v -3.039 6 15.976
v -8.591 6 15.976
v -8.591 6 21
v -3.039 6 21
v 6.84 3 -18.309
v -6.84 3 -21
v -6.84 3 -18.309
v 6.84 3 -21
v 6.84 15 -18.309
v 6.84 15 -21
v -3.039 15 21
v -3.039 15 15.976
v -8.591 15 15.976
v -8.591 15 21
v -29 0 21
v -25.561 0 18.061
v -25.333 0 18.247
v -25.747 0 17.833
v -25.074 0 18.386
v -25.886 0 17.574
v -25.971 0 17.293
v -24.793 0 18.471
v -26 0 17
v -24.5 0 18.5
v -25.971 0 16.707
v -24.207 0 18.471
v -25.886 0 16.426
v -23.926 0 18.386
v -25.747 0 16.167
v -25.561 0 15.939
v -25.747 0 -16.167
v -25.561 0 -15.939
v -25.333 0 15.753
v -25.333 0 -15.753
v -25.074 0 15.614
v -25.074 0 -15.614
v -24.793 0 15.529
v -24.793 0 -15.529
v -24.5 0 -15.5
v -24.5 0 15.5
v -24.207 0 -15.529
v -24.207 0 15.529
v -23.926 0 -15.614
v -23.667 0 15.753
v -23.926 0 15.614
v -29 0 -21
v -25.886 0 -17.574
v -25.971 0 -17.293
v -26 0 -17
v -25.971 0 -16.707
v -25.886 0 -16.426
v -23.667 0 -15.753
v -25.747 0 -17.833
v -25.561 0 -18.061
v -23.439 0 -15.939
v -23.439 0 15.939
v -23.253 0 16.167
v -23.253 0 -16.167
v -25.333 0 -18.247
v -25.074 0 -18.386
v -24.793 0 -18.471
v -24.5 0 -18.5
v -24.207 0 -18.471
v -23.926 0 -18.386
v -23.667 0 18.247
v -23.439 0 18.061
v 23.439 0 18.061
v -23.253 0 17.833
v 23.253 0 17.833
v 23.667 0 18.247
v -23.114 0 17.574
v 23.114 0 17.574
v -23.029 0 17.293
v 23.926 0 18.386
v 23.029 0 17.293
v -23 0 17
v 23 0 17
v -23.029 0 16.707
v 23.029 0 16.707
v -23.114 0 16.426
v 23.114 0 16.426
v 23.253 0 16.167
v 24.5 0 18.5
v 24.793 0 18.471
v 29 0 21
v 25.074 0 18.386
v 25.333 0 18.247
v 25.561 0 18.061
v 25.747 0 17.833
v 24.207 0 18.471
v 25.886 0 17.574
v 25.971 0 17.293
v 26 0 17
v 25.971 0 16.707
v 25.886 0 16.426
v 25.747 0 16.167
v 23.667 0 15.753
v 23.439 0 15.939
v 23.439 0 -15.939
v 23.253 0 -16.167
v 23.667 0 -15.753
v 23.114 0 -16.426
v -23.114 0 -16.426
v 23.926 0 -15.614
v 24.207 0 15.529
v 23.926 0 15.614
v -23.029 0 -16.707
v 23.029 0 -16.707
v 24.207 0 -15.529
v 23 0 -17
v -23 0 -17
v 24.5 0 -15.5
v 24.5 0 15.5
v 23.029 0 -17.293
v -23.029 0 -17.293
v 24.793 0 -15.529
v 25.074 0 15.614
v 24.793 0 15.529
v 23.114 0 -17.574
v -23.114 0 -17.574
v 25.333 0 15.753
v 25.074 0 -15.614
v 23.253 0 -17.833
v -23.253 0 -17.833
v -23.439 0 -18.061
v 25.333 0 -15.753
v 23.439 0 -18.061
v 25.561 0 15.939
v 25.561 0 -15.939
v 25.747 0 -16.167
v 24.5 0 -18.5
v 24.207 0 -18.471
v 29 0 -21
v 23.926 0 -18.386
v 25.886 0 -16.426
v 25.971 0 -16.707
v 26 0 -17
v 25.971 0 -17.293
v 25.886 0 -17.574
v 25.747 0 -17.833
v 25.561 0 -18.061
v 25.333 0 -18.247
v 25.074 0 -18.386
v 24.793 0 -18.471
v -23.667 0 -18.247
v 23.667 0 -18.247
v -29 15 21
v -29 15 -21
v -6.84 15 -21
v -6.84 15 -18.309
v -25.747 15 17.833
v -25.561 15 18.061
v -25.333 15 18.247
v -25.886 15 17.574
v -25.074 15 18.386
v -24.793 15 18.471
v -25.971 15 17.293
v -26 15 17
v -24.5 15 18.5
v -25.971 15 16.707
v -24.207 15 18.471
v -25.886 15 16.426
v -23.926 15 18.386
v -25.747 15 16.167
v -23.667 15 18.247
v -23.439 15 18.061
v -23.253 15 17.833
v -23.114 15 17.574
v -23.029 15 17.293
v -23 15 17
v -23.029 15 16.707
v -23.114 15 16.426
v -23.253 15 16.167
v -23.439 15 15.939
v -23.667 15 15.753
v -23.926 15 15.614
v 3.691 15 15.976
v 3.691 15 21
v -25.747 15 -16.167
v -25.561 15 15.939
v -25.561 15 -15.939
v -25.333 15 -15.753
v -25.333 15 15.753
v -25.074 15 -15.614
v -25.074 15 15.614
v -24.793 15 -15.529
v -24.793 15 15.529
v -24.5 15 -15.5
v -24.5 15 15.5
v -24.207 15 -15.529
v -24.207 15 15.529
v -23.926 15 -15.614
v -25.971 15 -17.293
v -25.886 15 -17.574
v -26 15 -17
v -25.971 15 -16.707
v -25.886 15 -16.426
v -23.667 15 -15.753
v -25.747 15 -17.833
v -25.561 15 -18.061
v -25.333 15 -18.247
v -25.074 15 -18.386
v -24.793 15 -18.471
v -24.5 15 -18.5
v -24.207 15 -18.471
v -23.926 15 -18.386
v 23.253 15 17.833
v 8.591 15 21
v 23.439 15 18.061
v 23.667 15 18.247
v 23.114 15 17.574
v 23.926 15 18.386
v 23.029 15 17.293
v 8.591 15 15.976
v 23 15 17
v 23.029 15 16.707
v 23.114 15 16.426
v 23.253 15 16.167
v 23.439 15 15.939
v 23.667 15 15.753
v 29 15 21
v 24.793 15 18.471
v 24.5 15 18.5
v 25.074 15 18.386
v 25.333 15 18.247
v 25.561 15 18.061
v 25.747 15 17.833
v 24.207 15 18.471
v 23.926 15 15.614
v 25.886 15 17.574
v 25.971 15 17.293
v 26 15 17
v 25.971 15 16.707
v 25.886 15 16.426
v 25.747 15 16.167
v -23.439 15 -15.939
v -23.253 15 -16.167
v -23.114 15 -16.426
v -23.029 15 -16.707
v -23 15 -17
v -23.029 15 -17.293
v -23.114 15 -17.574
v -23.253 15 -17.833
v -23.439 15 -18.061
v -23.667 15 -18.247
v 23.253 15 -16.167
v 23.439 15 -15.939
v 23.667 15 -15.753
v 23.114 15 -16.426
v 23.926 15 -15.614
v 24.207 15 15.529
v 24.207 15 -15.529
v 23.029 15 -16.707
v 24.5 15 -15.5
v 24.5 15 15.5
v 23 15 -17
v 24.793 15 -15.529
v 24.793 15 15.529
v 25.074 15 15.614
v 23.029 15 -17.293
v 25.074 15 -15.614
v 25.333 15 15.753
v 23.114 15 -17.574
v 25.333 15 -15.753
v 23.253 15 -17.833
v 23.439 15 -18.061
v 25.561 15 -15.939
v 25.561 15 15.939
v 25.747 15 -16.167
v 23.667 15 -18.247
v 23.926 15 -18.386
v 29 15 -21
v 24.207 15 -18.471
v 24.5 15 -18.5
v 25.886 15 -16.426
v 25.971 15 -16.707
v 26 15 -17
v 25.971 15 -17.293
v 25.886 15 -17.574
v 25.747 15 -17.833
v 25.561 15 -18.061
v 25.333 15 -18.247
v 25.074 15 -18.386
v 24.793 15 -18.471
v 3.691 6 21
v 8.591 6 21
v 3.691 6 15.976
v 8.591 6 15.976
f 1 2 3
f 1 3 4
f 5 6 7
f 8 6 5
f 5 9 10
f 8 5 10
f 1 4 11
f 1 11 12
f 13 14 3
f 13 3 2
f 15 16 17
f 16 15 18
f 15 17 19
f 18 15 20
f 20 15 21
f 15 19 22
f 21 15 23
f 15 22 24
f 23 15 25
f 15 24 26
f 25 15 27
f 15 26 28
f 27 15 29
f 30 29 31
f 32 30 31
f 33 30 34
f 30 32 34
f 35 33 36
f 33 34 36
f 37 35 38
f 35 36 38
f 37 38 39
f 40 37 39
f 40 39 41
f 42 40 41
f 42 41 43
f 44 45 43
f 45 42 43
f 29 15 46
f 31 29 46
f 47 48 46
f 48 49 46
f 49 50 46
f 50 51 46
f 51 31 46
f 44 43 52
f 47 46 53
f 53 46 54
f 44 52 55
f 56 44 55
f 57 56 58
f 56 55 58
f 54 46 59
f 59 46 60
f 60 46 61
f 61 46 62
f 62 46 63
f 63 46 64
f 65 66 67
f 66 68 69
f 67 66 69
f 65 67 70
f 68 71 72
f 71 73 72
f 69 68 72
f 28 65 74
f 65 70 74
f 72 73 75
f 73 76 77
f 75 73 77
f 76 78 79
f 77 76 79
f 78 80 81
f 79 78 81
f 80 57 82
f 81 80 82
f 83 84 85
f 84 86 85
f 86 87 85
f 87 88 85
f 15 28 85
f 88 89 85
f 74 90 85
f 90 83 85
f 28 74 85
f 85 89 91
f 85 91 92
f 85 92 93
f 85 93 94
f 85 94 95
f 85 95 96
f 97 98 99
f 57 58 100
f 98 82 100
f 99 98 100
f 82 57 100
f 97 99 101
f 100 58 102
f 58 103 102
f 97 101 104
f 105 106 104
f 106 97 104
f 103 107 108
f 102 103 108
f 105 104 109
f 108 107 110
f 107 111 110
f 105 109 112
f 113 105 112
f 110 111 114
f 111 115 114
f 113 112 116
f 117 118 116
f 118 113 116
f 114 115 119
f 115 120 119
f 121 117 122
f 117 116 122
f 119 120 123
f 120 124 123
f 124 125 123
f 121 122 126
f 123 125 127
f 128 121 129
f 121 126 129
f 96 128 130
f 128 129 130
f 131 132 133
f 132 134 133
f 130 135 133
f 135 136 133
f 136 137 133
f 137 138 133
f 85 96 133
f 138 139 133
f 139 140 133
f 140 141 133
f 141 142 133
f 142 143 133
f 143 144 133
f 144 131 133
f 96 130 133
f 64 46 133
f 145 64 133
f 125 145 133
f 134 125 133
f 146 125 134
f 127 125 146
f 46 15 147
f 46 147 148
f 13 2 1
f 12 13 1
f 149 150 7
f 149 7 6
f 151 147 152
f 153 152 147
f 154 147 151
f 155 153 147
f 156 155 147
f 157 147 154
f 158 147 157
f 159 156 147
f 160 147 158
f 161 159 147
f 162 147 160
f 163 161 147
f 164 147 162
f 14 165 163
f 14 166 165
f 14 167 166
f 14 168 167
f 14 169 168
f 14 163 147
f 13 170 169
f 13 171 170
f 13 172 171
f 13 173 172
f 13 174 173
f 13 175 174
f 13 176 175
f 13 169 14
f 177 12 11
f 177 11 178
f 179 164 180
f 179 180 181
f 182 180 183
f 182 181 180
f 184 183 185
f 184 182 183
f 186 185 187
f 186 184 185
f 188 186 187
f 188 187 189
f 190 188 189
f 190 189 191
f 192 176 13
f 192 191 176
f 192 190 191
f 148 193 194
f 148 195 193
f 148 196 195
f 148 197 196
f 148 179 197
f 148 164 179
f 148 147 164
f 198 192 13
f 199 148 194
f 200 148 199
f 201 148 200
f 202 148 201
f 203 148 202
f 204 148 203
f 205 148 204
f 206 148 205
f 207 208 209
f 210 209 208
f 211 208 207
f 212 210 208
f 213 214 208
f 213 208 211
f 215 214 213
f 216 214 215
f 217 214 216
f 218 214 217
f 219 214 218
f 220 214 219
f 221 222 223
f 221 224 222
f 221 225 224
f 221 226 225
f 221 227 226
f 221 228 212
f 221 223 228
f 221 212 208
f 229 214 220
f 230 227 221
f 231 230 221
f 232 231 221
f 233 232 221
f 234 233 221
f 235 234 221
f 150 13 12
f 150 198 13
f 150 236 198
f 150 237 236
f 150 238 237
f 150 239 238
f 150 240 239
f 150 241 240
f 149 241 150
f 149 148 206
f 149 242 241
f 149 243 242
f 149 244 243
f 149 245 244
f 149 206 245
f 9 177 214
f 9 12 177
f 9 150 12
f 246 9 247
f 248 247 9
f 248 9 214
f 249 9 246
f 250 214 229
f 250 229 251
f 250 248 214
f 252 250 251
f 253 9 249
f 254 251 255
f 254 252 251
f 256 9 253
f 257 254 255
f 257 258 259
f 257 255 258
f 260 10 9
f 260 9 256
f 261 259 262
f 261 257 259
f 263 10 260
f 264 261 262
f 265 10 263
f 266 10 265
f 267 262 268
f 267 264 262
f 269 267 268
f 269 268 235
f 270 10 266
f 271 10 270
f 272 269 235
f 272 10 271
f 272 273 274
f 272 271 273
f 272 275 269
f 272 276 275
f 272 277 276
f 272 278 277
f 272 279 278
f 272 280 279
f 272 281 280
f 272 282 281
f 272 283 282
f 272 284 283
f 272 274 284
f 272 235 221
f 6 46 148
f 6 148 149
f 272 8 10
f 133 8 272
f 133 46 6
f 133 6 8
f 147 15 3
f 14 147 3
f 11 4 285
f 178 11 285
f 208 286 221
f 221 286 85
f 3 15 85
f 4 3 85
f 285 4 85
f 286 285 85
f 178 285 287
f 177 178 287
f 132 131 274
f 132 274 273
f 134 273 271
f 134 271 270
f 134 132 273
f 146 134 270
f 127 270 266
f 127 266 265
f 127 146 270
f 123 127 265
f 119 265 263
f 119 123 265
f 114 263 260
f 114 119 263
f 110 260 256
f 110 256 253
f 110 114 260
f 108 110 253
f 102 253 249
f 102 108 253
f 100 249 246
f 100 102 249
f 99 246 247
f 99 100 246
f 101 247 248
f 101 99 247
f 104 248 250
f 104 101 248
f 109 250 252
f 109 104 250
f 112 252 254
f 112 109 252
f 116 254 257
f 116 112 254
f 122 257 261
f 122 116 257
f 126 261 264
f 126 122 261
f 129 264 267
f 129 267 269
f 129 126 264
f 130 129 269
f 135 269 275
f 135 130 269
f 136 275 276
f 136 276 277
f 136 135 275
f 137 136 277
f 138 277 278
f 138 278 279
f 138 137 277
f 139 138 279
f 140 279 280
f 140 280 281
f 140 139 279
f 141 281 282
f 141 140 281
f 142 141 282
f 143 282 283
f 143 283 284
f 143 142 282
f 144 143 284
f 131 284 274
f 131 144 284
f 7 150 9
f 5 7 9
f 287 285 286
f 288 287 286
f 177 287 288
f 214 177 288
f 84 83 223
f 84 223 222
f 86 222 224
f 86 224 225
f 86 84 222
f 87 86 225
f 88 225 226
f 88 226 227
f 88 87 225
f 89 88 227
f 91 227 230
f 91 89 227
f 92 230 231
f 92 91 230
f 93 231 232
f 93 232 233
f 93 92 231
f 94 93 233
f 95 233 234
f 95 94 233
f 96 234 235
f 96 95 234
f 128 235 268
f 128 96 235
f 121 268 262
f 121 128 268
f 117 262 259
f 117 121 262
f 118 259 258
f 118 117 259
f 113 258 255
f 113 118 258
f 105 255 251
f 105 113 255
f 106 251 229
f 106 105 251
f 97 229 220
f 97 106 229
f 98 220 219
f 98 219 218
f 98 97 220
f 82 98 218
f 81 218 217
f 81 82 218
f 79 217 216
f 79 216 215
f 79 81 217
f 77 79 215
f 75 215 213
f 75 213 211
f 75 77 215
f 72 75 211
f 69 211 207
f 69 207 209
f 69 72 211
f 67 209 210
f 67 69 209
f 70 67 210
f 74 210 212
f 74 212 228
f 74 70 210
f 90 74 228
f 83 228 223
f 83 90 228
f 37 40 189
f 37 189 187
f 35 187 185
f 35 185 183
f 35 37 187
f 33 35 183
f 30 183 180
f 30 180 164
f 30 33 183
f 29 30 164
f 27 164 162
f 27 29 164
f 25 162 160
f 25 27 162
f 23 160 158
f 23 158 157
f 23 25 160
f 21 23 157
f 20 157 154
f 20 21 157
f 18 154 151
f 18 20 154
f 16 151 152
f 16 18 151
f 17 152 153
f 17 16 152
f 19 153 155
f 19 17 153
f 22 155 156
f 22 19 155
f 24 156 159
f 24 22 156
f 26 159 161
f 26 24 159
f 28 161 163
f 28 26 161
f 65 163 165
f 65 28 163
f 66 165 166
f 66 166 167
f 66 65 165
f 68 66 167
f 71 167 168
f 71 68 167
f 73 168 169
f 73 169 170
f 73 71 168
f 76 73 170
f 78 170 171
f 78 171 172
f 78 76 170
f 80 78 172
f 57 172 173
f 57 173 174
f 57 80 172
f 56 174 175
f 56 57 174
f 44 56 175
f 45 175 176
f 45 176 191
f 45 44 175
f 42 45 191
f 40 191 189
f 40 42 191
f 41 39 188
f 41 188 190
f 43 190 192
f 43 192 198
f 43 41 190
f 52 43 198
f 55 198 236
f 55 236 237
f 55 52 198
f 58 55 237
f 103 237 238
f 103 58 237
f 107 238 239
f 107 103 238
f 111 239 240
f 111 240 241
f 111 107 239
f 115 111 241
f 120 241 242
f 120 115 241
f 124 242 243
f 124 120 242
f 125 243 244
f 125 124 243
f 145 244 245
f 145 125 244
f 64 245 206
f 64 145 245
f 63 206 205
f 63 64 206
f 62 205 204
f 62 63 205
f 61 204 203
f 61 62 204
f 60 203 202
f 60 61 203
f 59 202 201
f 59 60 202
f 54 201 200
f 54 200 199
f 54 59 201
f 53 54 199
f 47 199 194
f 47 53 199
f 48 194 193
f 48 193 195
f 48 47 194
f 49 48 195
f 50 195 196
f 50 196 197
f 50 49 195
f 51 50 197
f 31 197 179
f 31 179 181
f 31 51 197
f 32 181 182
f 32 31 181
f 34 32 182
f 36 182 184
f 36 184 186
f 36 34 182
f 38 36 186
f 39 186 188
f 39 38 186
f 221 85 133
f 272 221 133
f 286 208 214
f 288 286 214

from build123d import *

# Parameters (mm, degrees)
SKETCH_1_W          = 58
SKETCH_1_H          = 42
SKETCH_1_R          = 1.5
EXTRUDE_1_DEPTH     = 15
SKETCH_2_W          = 13.679310014
SKETCH_2_H          = 5.381736476
CUT_EXTRUDE_1_DEPTH = 12
SKETCH_3_W          = 17.182547944
SKETCH_3_H          = 10.048106392
CUT_EXTRUDE_2_DEPTH = 9
SKETCH_4_W          = 6.72992405
SKETCH_4_H          = 5.024053196
EXTRUDE_2_DEPTH     = 9


with BuildPart() as part:
    # 草图1 → 凸台-拉伸1 (new body)
    with BuildSketch(Plane(origin=(0, 0, 0), x_dir=(1, 0, 0), z_dir=(0, 1, 0))):
        Rectangle(SKETCH_1_W, SKETCH_1_H)
        with Locations(Location((-24.5, 17, 0), (0, 0, 270))):
            Circle(SKETCH_1_R, mode=Mode.SUBTRACT)
        with Locations(Location((-24.5, -17, 0), (0, 0, 90))):
            Circle(SKETCH_1_R, mode=Mode.SUBTRACT)
        with Locations(Location((24.5, -17, 0), (0, 0, 270))):
            Circle(SKETCH_1_R, mode=Mode.SUBTRACT)
        with Locations(Location((24.5, 17, 0), (0, 0, 90))):
            Circle(SKETCH_1_R, mode=Mode.SUBTRACT)
    extrude(amount=EXTRUDE_1_DEPTH)

    # 草图2 → 切除-拉伸1 (cut)
    with BuildSketch(Plane(origin=(0, 15, 0), x_dir=(1, 0, 0), z_dir=(0, 1, 0))):
        with Locations((0, 21)):
            Rectangle(SKETCH_2_W, SKETCH_2_H)
    extrude(amount=-CUT_EXTRUDE_1_DEPTH, mode=Mode.SUBTRACT)

    # 草图3 → 切除-拉伸2 (cut)
    with BuildSketch(Plane(origin=(0, 15, 0), x_dir=(1, 0, 0), z_dir=(0, 1, 0))):
        with Locations((0, -21)):
            Rectangle(SKETCH_3_W, SKETCH_3_H)
    extrude(amount=-CUT_EXTRUDE_2_DEPTH, mode=Mode.SUBTRACT)

    # 草图4 → 凸台-拉伸2 (add)
    with BuildSketch(Plane(origin=(0, 6, 0), x_dir=(1, 0, 0), z_dir=(0, 1, 0))):
        with Locations((0.325641486, -18.487973402)):
            Rectangle(SKETCH_4_W, SKETCH_4_H)
    extrude(amount=EXTRUDE_2_DEPTH)


solid = part.part
